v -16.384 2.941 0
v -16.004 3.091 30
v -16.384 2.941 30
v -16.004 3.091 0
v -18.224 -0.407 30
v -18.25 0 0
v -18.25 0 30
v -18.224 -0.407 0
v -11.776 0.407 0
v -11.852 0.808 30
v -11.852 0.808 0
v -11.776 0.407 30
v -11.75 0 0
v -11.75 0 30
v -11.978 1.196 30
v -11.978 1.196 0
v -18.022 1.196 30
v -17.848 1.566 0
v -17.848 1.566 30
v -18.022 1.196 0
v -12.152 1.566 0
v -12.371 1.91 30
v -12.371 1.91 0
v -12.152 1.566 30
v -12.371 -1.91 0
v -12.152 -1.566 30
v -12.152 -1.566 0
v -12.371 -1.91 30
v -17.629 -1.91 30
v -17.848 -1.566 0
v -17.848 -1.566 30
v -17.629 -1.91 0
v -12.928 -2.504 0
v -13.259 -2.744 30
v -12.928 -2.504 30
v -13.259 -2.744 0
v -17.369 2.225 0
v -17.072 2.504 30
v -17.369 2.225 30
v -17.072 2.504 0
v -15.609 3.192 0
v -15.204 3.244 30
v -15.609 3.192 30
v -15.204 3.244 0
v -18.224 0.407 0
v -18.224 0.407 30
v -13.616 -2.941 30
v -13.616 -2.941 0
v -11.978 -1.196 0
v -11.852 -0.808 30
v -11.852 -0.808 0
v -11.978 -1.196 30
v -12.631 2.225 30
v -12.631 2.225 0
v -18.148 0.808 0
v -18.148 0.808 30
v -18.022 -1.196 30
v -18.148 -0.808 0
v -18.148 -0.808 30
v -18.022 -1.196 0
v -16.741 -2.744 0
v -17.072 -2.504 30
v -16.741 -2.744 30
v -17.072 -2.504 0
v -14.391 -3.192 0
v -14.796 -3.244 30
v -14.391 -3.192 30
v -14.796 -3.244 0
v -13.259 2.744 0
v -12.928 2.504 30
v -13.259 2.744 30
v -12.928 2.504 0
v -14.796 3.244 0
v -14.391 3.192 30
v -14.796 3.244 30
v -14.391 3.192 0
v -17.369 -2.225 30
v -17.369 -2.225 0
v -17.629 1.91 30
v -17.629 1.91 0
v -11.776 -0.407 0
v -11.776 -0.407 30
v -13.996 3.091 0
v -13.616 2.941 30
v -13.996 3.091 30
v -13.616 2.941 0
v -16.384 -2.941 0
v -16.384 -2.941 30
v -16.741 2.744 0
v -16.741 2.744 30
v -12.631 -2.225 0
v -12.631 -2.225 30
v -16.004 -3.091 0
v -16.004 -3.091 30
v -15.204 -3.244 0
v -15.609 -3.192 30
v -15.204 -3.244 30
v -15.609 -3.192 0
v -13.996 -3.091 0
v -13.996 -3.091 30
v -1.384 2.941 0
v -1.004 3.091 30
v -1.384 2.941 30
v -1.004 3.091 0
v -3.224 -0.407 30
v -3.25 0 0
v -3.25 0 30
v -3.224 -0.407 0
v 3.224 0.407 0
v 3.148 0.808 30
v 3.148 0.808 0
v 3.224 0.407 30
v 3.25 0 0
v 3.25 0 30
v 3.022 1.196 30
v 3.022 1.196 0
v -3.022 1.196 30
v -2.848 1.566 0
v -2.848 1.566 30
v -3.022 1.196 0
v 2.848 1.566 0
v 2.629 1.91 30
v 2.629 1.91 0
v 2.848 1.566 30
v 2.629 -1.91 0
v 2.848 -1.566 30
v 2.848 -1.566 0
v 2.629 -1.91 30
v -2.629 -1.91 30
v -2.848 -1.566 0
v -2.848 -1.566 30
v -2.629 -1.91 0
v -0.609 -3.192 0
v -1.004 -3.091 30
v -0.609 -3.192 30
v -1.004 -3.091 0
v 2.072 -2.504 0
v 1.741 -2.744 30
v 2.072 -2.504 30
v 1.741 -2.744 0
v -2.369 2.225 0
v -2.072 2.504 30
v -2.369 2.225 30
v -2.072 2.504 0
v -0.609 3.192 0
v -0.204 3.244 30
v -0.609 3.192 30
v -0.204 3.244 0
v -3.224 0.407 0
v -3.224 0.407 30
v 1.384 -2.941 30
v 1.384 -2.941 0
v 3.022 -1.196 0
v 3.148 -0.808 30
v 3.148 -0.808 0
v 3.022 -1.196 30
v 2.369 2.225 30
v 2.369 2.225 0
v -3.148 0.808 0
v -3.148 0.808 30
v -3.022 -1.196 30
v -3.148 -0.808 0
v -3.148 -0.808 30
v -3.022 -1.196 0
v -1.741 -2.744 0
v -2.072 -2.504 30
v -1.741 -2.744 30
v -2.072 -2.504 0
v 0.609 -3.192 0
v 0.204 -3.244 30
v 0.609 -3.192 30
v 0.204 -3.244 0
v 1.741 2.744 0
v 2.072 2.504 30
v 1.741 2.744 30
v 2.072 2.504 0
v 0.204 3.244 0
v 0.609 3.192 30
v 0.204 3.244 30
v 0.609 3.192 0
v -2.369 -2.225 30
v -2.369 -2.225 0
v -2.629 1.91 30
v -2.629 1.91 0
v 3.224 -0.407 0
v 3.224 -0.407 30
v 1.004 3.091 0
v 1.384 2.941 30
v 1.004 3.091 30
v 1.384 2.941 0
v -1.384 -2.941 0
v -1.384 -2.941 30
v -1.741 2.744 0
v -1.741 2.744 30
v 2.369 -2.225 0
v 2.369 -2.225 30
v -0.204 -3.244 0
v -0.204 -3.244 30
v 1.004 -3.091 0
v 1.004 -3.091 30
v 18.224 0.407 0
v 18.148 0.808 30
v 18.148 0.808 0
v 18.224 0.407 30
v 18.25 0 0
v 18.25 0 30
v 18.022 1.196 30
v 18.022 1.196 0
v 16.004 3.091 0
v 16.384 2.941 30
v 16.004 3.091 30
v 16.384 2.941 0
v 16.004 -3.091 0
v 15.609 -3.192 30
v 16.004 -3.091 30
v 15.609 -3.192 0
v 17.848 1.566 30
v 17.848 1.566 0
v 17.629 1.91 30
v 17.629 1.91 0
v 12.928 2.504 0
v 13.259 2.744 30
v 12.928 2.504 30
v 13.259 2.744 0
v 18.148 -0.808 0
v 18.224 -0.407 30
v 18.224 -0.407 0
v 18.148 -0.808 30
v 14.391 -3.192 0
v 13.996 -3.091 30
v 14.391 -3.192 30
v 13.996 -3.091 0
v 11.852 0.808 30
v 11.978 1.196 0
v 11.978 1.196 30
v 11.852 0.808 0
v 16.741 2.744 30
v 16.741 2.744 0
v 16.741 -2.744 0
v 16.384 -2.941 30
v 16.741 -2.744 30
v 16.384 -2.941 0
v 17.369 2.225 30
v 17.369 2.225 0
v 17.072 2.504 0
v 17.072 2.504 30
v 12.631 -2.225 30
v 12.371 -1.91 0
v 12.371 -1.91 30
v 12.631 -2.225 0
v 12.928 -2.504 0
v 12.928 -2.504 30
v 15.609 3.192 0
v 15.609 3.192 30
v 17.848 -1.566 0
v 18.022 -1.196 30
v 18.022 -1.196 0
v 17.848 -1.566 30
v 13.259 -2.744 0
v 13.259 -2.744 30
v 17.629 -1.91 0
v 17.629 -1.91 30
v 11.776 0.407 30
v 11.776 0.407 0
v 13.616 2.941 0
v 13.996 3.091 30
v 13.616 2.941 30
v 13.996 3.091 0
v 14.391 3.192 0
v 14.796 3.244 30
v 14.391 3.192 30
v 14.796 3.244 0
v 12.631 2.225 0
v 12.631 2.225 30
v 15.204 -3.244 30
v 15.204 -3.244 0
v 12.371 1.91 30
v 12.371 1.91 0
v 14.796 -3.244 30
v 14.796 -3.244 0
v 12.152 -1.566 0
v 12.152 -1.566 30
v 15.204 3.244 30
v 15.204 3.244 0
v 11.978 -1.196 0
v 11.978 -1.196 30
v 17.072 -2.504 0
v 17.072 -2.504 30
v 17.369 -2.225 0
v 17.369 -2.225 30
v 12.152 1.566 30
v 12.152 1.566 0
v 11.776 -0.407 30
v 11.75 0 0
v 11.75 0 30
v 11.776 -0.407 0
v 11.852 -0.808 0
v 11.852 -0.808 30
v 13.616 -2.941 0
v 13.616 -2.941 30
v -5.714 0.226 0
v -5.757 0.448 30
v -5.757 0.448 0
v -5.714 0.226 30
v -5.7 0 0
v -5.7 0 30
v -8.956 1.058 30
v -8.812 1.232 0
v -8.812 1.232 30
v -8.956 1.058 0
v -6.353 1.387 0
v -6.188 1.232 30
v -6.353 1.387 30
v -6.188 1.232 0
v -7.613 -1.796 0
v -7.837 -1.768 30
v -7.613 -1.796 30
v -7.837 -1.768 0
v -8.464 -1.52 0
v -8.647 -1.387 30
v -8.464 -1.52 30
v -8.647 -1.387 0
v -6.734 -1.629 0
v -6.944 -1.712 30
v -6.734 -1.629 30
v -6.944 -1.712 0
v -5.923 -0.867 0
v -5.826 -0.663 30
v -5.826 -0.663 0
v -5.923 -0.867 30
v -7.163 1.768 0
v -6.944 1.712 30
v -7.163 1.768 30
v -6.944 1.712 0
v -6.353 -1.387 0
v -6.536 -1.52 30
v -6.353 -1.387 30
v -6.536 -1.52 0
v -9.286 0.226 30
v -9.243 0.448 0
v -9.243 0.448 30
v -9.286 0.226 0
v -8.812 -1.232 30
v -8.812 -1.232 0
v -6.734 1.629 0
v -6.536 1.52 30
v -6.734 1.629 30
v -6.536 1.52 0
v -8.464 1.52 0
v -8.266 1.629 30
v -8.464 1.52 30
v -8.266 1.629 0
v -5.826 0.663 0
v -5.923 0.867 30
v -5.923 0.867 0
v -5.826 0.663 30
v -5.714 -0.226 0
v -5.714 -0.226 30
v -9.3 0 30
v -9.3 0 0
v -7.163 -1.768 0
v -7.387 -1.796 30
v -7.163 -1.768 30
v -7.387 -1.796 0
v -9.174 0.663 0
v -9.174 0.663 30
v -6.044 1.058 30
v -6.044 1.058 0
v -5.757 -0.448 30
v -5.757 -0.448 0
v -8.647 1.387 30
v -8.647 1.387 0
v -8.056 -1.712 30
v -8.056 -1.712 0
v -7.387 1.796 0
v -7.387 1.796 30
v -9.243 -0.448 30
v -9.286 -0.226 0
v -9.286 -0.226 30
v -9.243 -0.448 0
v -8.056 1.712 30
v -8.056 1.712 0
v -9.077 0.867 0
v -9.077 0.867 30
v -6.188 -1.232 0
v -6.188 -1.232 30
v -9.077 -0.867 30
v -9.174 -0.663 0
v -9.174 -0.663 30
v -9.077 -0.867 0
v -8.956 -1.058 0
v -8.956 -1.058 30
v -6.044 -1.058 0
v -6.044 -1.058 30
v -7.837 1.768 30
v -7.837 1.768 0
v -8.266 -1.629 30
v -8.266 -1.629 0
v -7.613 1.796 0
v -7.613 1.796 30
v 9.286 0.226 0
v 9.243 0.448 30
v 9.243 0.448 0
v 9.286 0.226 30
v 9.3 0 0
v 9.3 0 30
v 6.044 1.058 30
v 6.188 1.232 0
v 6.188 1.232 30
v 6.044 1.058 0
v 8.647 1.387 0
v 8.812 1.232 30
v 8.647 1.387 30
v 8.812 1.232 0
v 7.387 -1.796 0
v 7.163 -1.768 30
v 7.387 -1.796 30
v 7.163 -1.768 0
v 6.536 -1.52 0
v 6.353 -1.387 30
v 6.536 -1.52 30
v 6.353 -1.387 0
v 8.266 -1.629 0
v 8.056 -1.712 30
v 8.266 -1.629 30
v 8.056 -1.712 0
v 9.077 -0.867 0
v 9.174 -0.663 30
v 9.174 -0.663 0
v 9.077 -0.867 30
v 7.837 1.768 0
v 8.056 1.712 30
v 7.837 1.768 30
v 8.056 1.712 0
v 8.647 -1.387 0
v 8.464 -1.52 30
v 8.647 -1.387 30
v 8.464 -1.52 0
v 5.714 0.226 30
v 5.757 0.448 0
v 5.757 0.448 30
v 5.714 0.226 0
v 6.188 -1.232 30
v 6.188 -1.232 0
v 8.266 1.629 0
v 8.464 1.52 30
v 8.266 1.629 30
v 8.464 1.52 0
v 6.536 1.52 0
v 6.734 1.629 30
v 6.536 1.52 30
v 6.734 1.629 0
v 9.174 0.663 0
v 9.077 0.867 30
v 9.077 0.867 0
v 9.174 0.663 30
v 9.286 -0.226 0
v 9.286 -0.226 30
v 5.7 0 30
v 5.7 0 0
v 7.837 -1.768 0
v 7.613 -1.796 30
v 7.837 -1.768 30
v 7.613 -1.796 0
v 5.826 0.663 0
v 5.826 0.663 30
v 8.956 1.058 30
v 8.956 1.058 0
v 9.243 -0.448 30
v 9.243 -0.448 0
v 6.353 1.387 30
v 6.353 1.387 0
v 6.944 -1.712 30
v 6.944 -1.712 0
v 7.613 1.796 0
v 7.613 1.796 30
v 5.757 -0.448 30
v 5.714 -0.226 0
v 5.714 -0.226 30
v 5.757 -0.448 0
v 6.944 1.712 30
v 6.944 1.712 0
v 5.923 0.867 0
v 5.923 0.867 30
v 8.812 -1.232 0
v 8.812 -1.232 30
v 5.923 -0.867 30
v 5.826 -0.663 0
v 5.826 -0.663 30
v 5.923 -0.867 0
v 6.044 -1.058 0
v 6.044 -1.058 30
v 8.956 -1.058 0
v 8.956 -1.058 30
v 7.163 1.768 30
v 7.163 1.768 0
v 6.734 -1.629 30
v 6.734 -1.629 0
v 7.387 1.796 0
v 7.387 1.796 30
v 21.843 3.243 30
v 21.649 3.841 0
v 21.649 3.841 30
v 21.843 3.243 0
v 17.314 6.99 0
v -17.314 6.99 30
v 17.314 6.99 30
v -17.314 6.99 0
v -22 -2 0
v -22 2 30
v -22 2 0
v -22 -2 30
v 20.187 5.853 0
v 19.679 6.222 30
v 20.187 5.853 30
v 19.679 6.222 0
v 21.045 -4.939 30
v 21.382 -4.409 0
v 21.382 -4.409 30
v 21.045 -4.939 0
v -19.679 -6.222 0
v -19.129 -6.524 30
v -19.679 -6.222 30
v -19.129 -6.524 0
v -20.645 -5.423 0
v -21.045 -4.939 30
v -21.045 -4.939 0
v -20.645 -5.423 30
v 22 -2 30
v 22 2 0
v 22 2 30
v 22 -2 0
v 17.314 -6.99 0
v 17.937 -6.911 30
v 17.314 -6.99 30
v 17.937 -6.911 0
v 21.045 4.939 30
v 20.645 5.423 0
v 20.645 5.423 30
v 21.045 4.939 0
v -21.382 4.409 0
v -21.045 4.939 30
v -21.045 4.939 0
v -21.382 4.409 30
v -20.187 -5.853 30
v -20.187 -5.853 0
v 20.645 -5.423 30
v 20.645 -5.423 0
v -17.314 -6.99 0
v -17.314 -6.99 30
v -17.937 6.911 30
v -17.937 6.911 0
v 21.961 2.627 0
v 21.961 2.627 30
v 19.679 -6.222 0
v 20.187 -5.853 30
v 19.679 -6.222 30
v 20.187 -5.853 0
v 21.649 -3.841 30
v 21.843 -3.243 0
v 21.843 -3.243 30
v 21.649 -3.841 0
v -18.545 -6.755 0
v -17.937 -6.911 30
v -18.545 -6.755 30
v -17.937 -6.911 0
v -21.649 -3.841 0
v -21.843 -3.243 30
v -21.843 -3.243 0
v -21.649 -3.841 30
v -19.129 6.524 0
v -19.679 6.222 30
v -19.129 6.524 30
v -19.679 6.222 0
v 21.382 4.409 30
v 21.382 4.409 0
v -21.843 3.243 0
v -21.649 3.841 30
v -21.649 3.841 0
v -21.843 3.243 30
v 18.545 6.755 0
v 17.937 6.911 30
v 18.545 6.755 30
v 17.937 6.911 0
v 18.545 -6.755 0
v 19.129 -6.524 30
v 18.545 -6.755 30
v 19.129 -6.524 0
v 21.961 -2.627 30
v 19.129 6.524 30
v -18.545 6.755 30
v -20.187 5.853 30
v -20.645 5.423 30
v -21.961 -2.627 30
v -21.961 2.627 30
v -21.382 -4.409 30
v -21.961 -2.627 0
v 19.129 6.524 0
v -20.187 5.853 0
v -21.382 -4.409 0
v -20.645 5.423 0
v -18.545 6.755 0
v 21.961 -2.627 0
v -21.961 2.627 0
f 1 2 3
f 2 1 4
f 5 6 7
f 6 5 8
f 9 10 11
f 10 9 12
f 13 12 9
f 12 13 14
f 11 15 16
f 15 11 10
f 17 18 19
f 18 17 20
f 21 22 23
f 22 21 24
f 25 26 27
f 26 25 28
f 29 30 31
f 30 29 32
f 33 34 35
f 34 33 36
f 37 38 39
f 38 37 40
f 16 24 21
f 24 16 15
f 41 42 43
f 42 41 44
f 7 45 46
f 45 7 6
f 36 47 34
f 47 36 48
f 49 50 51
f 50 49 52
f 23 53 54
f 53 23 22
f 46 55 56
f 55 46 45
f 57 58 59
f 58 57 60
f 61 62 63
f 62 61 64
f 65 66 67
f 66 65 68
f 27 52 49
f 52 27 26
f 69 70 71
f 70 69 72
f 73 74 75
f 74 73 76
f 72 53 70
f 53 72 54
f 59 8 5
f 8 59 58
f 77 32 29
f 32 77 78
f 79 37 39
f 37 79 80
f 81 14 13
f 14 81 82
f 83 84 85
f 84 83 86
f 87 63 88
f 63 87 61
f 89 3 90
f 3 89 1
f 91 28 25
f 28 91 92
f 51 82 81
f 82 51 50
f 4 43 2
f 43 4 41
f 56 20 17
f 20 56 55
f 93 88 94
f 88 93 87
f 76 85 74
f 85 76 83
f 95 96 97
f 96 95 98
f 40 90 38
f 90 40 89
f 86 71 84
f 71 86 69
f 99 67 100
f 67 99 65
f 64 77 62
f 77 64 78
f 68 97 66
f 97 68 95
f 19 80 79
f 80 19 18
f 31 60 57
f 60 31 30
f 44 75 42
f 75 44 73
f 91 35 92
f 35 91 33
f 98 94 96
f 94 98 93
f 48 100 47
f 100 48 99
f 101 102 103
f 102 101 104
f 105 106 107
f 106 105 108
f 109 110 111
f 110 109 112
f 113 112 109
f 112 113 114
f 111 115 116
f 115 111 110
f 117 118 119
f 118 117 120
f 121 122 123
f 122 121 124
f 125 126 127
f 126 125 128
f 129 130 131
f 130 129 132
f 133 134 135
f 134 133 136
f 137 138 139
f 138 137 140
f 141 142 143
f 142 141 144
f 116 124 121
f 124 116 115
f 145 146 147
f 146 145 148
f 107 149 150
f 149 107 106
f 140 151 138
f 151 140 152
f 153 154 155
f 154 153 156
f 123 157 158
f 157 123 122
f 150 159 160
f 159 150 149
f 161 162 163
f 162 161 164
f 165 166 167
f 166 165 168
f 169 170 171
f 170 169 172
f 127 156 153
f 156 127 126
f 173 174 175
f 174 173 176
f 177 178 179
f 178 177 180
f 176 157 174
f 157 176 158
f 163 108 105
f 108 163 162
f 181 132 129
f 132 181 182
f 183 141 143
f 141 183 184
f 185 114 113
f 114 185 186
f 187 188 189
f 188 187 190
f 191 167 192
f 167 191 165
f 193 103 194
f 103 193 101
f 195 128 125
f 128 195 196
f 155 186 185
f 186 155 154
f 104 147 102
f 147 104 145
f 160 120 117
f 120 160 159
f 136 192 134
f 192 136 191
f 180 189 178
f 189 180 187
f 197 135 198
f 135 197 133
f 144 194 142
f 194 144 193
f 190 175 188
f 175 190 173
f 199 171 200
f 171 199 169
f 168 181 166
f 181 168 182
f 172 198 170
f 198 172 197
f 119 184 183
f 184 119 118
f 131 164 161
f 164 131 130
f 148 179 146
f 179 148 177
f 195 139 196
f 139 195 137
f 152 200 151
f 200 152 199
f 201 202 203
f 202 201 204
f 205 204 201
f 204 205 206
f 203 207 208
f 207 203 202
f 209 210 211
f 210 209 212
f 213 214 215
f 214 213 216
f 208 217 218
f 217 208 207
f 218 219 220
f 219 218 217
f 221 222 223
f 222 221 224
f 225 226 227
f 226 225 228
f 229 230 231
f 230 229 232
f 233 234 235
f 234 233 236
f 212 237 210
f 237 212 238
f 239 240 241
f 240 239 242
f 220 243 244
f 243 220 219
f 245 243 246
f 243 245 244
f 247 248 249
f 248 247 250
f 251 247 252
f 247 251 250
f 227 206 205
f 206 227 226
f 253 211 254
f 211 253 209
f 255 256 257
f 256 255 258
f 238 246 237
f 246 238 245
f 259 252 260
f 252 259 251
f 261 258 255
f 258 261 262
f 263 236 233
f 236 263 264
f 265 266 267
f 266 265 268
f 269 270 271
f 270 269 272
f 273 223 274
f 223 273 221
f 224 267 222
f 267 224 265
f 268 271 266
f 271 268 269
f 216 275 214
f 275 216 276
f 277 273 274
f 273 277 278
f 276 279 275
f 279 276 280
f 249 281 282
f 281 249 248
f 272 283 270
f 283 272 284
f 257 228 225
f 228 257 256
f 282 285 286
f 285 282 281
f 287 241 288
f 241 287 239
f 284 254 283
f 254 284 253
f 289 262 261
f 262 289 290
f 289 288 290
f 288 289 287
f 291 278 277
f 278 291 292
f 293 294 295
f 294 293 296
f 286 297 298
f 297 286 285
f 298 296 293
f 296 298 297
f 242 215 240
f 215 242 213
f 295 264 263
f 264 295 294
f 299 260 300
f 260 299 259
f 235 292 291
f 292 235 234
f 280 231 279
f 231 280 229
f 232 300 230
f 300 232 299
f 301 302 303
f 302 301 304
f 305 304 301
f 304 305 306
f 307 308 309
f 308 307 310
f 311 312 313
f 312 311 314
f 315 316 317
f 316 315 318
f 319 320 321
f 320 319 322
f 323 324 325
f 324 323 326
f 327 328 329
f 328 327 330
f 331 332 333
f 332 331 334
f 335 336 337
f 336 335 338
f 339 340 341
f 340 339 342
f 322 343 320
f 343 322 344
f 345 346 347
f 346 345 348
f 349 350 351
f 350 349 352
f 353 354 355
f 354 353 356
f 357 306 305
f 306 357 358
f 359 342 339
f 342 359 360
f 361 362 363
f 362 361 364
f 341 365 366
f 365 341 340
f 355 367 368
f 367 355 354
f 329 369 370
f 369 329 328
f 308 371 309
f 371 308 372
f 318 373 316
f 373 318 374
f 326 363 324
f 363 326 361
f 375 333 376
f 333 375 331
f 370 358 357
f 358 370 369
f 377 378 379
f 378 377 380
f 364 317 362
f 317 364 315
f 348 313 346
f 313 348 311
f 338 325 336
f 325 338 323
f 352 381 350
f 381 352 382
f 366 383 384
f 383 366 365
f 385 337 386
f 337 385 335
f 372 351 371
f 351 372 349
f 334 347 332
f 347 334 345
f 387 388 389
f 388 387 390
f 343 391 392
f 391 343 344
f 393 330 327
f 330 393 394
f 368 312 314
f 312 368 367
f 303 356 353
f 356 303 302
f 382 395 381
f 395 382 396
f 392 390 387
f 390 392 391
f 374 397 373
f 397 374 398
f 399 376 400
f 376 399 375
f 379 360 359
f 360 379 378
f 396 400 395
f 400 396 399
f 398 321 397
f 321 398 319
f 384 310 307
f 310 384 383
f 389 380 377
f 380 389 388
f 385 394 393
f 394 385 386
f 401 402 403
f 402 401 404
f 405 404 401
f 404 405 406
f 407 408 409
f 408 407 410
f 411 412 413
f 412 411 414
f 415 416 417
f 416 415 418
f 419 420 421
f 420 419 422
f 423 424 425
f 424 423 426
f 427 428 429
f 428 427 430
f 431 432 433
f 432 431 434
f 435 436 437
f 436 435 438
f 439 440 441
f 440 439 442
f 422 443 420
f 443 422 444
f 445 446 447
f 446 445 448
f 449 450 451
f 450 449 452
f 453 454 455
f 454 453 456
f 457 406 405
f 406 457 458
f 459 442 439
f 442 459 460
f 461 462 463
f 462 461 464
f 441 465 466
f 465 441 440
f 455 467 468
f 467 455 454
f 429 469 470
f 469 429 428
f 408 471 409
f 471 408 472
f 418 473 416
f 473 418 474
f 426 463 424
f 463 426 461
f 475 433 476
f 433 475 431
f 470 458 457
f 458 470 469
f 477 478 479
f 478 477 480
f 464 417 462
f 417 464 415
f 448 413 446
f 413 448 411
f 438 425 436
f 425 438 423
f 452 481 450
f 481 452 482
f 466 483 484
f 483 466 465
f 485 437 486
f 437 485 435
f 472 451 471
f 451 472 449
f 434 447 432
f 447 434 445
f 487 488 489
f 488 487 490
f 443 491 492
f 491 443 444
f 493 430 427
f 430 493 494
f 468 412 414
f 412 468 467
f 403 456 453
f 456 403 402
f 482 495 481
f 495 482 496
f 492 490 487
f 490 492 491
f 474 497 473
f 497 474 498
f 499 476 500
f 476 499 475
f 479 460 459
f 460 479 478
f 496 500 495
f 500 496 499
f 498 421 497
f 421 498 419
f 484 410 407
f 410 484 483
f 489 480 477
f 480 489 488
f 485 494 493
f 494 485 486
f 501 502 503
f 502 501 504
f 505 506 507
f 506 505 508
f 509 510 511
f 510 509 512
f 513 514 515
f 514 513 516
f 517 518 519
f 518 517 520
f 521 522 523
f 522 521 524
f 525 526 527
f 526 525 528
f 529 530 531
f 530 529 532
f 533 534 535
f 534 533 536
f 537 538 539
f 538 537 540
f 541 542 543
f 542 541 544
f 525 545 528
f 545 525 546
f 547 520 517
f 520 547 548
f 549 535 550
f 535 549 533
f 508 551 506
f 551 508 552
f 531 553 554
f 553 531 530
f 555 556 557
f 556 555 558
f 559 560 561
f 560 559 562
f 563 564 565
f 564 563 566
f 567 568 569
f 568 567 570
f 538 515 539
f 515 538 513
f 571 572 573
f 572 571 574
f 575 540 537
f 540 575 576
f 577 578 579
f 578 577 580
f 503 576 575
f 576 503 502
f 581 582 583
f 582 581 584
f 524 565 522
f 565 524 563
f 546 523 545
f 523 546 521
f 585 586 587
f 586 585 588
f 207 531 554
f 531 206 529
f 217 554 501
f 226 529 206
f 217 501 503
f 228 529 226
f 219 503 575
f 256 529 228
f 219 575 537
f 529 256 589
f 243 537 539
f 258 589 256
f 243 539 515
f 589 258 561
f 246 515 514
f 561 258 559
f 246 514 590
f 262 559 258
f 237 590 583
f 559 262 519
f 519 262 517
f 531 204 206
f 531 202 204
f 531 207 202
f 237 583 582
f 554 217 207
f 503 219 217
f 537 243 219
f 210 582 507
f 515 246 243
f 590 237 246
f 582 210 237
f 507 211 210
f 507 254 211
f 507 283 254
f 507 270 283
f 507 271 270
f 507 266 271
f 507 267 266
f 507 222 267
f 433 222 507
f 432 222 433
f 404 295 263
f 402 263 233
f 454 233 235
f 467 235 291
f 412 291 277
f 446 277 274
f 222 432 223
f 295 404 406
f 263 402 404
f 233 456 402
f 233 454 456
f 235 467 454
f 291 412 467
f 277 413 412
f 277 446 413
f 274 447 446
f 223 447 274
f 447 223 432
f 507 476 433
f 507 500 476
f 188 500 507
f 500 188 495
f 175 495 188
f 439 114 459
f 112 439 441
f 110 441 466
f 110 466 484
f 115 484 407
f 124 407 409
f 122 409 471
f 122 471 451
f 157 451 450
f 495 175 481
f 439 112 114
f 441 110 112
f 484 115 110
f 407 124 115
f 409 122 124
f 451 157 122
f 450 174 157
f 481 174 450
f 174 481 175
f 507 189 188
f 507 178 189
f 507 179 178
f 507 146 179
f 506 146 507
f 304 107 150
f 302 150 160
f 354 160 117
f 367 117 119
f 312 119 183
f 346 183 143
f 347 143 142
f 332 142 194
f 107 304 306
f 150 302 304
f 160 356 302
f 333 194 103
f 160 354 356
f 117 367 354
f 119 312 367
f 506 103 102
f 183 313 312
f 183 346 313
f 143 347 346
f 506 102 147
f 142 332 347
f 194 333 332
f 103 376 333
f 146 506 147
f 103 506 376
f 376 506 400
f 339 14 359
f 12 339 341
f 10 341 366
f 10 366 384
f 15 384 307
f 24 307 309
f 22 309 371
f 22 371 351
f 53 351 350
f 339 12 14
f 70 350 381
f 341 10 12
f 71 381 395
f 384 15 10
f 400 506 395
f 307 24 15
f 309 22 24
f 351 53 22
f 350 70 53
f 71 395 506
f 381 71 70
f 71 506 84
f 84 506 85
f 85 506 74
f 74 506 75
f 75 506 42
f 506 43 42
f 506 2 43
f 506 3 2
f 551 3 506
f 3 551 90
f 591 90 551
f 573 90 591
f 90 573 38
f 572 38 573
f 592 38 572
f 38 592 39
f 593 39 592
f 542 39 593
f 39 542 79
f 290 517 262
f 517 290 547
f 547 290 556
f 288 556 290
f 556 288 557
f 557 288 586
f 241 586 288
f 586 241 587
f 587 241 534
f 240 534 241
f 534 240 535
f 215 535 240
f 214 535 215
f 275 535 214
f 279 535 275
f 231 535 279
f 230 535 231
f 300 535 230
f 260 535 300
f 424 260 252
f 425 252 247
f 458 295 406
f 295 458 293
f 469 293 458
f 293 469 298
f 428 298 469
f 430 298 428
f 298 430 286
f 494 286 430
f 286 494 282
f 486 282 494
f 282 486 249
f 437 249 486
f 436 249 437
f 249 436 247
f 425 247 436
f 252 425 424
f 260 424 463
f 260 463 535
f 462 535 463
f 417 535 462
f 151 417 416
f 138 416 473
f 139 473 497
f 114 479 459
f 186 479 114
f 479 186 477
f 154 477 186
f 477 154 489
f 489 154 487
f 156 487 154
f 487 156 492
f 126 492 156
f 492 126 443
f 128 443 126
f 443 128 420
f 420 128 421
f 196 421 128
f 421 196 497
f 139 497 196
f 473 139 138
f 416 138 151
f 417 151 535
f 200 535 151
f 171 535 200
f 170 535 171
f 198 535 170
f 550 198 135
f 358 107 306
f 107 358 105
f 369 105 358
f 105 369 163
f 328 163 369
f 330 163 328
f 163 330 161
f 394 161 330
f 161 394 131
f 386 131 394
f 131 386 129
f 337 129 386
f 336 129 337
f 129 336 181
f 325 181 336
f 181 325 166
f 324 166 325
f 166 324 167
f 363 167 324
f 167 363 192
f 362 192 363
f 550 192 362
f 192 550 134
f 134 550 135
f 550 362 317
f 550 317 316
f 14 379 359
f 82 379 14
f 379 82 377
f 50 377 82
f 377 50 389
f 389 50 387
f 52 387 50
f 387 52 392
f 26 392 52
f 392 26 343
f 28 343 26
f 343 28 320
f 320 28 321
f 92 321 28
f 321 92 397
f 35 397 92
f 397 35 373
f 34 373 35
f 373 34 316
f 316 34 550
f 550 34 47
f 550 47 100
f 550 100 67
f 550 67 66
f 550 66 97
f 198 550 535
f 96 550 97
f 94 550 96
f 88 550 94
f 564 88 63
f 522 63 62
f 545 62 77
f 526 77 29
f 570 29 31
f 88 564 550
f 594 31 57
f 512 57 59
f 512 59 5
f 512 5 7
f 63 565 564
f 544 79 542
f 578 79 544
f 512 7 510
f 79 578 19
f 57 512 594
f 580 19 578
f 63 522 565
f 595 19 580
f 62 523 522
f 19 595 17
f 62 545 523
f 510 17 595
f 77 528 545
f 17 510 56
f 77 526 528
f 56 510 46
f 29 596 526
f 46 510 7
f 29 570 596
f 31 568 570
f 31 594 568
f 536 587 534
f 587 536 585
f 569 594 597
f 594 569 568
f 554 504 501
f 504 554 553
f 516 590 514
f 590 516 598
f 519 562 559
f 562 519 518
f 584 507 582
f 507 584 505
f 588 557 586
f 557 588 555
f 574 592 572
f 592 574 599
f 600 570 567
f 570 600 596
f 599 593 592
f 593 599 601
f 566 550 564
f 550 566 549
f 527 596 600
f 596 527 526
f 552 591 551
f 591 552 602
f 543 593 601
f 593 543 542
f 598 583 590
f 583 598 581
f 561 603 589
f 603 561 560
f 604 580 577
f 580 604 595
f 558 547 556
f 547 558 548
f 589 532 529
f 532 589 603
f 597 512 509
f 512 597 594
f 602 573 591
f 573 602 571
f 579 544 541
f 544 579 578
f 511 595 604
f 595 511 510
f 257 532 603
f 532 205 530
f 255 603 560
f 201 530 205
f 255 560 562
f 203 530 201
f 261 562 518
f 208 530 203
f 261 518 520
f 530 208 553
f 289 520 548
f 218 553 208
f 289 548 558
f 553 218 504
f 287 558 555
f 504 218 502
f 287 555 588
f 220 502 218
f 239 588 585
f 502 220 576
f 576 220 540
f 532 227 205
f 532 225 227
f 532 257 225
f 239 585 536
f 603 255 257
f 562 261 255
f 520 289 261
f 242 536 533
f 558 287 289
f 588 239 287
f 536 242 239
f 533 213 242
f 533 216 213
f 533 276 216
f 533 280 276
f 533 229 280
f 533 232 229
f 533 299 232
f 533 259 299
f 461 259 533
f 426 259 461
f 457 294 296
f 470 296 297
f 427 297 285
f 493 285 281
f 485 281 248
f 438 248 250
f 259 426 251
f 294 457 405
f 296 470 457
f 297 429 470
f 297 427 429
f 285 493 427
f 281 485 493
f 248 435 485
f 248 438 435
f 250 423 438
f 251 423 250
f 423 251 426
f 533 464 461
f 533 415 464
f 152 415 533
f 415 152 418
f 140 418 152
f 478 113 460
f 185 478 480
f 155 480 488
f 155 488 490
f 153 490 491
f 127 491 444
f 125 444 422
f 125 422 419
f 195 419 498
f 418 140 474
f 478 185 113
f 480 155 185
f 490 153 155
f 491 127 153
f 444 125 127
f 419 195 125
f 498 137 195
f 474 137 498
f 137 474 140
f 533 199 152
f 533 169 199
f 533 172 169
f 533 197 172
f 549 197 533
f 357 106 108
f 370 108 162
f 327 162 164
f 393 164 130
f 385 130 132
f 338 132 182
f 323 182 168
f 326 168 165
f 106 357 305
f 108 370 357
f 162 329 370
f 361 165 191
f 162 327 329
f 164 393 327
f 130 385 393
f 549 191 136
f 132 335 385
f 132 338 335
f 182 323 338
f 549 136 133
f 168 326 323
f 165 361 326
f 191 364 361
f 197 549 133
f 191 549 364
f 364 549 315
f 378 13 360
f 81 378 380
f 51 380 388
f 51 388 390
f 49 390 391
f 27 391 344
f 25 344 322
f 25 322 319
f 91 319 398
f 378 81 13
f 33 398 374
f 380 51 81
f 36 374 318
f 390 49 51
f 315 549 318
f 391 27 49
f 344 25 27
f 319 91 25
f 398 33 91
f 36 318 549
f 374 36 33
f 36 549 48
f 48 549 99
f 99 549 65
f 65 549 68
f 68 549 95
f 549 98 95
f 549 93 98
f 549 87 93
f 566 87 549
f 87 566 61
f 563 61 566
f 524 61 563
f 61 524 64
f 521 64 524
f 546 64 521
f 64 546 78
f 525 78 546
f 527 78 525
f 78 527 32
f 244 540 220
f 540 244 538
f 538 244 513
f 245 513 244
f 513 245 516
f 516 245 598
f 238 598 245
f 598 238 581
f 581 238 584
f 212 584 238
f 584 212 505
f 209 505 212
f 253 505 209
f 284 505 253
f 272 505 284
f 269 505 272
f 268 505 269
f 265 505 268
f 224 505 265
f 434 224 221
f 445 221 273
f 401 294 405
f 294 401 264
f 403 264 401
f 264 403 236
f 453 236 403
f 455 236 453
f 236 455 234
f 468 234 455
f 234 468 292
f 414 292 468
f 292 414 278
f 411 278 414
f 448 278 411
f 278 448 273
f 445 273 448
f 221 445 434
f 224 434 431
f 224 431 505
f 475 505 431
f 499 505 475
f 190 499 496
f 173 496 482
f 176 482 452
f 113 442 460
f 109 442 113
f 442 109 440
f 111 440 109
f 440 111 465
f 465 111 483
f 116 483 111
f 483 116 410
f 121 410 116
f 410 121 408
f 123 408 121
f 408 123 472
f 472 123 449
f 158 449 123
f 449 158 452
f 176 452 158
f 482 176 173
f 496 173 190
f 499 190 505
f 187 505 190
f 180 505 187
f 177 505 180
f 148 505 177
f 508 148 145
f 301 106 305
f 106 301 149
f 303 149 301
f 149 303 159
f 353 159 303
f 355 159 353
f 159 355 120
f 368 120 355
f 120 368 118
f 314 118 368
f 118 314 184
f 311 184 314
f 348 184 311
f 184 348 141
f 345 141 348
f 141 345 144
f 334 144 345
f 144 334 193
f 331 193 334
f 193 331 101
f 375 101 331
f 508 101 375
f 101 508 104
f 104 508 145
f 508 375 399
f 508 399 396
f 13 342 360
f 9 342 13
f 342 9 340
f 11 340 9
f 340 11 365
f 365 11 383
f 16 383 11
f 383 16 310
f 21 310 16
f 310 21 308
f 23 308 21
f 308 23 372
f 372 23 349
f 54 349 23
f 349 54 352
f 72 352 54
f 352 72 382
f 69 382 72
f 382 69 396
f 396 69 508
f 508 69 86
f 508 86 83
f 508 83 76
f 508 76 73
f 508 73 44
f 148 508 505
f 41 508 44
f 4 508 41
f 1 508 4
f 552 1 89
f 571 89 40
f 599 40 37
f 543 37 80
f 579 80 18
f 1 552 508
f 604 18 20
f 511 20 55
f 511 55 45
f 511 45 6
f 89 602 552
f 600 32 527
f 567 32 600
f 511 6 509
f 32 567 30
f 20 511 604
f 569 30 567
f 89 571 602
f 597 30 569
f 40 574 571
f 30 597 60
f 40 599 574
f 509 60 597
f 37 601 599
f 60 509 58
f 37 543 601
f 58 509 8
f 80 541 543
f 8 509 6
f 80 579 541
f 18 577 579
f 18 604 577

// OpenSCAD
$fn = 50;


difference() {
	union() {
		hull() {
			translate(v = [-17.0000000000, 2.0000000000, 0]) {
				cylinder(h = 30, r = 5);
			}
			translate(v = [17.0000000000, 2.0000000000, 0]) {
				cylinder(h = 30, r = 5);
			}
			translate(v = [-17.0000000000, -2.0000000000, 0]) {
				cylinder(h = 30, r = 5);
			}
			translate(v = [17.0000000000, -2.0000000000, 0]) {
				cylinder(h = 30, r = 5);
			}
		}
	}
	union() {
		translate(v = [-15.0000000000, 0.0000000000, 0]) {
			translate(v = [0, 0, -100]) {
				cylinder(h = 200, r = 3.2500000000);
			}
		}
		translate(v = [0, 0, -100]) {
			cylinder(h = 200, r = 3.2500000000);
		}
		translate(v = [15.0000000000, 0.0000000000, 0]) {
			translate(v = [0, 0, -100]) {
				cylinder(h = 200, r = 3.2500000000);
			}
		}
		translate(v = [-15.0000000000, 0.0000000000, 0]) {
			translate(v = [0, 0, -100]) {
				cylinder(h = 200, r = 1.8000000000);
			}
		}
		translate(v = [-7.5000000000, 0.0000000000, 0]) {
			translate(v = [0, 0, -100]) {
				cylinder(h = 200, r = 1.8000000000);
			}
		}
		translate(v = [0, 0, -100]) {
			cylinder(h = 200, r = 1.8000000000);
		}
		translate(v = [7.5000000000, 0.0000000000, 0]) {
			translate(v = [0, 0, -100]) {
				cylinder(h = 200, r = 1.8000000000);
			}
		}
		translate(v = [15.0000000000, 0.0000000000, 0]) {
			translate(v = [0, 0, -100]) {
				cylinder(h = 200, r = 1.8000000000);
			}
		}
	}
}
